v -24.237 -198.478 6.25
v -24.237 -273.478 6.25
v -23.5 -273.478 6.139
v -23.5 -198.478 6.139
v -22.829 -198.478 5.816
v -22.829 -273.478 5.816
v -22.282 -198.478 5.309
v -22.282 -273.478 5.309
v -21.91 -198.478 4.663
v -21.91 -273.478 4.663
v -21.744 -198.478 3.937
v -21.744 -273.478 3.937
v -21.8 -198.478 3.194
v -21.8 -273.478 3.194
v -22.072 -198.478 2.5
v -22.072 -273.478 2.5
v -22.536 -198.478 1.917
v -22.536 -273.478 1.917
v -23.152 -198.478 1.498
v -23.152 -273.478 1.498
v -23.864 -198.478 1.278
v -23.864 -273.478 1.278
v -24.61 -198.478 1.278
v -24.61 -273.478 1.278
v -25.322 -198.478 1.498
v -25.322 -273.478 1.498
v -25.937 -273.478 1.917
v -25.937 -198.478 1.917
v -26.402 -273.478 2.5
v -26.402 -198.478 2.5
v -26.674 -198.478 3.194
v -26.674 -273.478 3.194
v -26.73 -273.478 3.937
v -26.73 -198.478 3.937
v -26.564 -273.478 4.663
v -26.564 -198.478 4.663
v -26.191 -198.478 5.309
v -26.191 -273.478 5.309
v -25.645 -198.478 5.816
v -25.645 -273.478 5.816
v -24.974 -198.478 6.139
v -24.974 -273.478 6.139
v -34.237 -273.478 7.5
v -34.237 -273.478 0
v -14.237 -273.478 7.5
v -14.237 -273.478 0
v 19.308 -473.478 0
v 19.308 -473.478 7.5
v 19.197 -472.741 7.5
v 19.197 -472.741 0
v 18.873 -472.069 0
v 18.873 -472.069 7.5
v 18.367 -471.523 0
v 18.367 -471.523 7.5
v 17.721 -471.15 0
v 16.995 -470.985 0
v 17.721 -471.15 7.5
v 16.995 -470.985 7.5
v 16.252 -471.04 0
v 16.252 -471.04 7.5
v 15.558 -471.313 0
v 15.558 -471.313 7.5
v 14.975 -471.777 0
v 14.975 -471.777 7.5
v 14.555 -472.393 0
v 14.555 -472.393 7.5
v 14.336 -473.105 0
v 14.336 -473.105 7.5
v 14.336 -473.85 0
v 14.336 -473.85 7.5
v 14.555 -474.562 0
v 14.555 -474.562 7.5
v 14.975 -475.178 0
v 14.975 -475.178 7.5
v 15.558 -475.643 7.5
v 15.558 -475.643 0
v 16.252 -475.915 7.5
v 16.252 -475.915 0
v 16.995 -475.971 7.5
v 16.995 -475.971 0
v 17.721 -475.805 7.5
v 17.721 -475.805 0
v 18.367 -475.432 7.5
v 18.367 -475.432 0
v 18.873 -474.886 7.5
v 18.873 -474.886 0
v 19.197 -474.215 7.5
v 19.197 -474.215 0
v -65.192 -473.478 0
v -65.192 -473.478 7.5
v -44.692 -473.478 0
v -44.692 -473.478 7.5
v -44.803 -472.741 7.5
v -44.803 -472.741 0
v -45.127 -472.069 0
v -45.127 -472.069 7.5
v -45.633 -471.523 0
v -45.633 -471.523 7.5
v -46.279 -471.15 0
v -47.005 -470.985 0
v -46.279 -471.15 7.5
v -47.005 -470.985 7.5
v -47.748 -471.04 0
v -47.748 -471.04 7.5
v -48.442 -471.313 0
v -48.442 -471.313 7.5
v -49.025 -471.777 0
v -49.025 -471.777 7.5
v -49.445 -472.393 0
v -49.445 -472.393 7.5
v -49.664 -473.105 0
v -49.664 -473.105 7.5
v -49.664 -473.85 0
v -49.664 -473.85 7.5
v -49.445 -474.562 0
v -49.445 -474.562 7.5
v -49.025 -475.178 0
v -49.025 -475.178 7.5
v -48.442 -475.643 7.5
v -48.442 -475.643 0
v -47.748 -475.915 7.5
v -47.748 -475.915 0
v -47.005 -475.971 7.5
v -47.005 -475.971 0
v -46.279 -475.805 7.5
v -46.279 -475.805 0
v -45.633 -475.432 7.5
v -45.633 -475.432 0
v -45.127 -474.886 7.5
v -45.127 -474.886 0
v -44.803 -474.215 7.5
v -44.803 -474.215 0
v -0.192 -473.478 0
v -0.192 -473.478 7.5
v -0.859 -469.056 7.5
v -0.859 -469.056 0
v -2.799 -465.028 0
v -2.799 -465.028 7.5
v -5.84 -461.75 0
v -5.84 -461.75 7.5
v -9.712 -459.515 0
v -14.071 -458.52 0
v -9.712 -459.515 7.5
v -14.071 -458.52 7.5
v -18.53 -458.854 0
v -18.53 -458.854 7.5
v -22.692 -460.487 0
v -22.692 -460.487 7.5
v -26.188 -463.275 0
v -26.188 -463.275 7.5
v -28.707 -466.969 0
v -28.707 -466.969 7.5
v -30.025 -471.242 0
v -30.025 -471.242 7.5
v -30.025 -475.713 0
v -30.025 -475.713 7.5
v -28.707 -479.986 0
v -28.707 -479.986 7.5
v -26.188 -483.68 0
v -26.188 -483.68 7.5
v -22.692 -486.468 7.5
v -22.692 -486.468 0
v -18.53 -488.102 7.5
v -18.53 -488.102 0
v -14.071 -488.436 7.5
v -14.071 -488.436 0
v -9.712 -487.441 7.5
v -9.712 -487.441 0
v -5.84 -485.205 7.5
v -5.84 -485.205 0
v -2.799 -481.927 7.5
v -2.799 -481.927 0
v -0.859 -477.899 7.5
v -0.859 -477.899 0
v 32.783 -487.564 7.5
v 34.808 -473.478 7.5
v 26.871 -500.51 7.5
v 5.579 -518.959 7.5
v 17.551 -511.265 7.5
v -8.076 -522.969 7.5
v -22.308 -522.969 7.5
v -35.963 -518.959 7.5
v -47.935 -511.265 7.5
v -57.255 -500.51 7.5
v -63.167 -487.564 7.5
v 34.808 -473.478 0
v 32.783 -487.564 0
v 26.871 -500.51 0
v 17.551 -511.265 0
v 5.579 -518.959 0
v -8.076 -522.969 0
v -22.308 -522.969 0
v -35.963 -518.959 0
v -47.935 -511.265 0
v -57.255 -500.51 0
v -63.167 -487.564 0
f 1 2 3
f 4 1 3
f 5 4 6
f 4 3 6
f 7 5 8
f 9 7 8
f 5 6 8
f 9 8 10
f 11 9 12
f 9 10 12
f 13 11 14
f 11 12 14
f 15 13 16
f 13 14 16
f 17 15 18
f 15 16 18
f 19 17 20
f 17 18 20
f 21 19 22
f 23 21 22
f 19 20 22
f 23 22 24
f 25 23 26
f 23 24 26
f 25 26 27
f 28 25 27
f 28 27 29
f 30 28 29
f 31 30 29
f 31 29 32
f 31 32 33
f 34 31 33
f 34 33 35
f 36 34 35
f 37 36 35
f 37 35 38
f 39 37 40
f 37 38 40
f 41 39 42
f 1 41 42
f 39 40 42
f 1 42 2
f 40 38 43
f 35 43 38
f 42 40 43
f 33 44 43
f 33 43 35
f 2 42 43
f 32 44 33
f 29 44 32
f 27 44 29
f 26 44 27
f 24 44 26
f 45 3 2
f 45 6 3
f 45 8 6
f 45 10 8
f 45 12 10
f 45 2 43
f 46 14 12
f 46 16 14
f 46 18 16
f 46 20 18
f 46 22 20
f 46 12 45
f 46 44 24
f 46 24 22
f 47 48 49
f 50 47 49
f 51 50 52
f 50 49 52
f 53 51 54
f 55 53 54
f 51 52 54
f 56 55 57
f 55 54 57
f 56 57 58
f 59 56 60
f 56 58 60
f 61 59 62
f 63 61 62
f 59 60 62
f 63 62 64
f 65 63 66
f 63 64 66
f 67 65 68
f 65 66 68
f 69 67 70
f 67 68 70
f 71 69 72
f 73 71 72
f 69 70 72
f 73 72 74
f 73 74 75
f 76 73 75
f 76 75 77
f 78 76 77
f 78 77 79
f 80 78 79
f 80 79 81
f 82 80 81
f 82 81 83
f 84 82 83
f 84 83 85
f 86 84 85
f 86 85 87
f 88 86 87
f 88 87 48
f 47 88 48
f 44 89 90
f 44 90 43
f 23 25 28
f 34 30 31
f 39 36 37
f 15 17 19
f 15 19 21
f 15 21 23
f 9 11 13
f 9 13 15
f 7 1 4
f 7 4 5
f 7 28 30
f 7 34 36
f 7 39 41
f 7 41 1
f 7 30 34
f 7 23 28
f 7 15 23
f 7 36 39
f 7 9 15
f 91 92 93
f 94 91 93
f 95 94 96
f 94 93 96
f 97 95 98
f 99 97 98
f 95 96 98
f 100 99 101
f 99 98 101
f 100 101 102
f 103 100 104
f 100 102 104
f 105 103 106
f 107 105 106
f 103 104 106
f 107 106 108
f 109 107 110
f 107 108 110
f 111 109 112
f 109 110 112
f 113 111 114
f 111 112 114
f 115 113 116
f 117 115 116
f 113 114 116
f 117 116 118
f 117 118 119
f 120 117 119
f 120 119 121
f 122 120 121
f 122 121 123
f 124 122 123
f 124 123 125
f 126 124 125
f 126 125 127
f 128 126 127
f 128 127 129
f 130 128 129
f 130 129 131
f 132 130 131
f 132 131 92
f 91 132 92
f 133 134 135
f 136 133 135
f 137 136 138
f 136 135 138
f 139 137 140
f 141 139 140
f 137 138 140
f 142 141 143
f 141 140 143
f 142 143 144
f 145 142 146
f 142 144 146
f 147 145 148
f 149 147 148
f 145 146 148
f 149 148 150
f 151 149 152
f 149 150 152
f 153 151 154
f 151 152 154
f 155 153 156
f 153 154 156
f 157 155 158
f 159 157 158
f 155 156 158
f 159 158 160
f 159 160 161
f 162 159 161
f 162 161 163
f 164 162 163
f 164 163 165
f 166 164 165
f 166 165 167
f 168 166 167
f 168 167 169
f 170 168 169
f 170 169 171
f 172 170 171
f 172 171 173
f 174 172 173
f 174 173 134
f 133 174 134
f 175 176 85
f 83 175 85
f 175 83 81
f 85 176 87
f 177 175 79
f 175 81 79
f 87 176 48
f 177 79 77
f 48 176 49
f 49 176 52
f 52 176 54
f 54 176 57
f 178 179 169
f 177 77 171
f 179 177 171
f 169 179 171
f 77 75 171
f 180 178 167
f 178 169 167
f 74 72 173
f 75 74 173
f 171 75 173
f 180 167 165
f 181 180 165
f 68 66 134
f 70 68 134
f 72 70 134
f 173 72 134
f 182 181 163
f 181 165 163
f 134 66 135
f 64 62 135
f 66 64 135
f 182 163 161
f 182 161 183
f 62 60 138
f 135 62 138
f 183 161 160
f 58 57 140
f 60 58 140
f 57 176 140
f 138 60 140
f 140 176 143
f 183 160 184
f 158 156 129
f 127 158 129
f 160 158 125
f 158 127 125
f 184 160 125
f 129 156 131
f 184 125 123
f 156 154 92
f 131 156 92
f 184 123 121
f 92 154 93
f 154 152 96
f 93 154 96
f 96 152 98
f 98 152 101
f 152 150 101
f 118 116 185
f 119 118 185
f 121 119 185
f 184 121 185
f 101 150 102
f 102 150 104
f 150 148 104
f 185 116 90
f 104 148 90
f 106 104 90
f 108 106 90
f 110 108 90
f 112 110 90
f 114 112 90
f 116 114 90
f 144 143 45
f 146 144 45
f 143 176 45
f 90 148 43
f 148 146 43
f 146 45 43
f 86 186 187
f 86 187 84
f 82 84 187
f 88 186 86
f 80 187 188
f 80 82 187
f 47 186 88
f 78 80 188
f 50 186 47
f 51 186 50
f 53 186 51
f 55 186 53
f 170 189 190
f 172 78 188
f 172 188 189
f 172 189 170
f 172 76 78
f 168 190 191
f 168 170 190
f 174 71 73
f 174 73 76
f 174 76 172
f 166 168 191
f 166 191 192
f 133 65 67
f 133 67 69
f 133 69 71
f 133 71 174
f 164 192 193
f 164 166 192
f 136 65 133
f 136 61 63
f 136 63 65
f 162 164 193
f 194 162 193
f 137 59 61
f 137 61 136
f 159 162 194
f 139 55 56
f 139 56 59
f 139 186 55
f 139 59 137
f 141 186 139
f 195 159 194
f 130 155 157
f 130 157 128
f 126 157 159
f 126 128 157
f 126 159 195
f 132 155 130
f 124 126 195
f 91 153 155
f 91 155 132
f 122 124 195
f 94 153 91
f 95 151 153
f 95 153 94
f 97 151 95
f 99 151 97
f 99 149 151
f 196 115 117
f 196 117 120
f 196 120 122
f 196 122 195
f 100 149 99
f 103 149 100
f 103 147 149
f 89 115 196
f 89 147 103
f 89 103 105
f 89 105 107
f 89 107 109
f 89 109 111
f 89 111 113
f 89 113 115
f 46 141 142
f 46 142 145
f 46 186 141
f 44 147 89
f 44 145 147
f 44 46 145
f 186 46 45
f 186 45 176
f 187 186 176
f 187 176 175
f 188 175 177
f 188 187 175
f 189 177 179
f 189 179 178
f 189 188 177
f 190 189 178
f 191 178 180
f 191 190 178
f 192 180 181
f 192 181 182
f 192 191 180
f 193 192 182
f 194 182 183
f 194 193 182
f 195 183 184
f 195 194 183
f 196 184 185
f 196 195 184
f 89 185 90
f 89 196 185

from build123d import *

# Parameters (mm, degrees)
BOSS_EXTRUDE1_DEPTH = 7.5
SKETCH3_R           = 2.5
BOSS_EXTRUDE2_DEPTH = 75
SKETCH4_R           = 15
SKETCH4_R_2         = 2.5
CUT_EXTRUDE1_DEPTH  = 528.574777612


with BuildPart() as part:
    # Sketch1 → Boss-Extrude1 (new body)
    with BuildSketch(Plane.XY):
        with BuildLine():
            Line((-34.236900243, -273.477678772), (-14.236900243, -273.477678772))
            Line((-14.236900243, -273.477678772), (34.807854774, -473.477678772))
            ThreePointArc((34.807854774, -473.477678772), (-15.192145226, -523.477678772), (-65.192145226, -473.477678772))
            Line((-65.192145226, -473.477678772), (-34.236900243, -273.477678772))
        make_face()
    extrude(amount=BOSS_EXTRUDE1_DEPTH)

    # Sketch3 → Boss-Extrude2 (add)
    with BuildSketch(Plane(origin=(0, -273.477678772, 0), x_dir=(1, 0, 0), z_dir=(0, 1, 0))):
        with Locations(Location((-24.236900243, -3.75, 0), (0, 0, 270))):
            Circle(SKETCH3_R)
    extrude(amount=BOSS_EXTRUDE2_DEPTH)

    # Sketch4 → Cut-Extrude1 (cut, through all)
    with BuildSketch(Plane.XY.offset(7.5)):
        with Locations((-15.192145226, -473.477678772)):
            Circle(SKETCH4_R)
        with Locations((16.807854774, -473.477678772)):
            Circle(SKETCH4_R_2)
        with Locations((-47.192145226, -473.477678772)):
            Circle(SKETCH4_R_2)
    extrude(amount=-CUT_EXTRUDE1_DEPTH, mode=Mode.SUBTRACT)


solid = part.part
